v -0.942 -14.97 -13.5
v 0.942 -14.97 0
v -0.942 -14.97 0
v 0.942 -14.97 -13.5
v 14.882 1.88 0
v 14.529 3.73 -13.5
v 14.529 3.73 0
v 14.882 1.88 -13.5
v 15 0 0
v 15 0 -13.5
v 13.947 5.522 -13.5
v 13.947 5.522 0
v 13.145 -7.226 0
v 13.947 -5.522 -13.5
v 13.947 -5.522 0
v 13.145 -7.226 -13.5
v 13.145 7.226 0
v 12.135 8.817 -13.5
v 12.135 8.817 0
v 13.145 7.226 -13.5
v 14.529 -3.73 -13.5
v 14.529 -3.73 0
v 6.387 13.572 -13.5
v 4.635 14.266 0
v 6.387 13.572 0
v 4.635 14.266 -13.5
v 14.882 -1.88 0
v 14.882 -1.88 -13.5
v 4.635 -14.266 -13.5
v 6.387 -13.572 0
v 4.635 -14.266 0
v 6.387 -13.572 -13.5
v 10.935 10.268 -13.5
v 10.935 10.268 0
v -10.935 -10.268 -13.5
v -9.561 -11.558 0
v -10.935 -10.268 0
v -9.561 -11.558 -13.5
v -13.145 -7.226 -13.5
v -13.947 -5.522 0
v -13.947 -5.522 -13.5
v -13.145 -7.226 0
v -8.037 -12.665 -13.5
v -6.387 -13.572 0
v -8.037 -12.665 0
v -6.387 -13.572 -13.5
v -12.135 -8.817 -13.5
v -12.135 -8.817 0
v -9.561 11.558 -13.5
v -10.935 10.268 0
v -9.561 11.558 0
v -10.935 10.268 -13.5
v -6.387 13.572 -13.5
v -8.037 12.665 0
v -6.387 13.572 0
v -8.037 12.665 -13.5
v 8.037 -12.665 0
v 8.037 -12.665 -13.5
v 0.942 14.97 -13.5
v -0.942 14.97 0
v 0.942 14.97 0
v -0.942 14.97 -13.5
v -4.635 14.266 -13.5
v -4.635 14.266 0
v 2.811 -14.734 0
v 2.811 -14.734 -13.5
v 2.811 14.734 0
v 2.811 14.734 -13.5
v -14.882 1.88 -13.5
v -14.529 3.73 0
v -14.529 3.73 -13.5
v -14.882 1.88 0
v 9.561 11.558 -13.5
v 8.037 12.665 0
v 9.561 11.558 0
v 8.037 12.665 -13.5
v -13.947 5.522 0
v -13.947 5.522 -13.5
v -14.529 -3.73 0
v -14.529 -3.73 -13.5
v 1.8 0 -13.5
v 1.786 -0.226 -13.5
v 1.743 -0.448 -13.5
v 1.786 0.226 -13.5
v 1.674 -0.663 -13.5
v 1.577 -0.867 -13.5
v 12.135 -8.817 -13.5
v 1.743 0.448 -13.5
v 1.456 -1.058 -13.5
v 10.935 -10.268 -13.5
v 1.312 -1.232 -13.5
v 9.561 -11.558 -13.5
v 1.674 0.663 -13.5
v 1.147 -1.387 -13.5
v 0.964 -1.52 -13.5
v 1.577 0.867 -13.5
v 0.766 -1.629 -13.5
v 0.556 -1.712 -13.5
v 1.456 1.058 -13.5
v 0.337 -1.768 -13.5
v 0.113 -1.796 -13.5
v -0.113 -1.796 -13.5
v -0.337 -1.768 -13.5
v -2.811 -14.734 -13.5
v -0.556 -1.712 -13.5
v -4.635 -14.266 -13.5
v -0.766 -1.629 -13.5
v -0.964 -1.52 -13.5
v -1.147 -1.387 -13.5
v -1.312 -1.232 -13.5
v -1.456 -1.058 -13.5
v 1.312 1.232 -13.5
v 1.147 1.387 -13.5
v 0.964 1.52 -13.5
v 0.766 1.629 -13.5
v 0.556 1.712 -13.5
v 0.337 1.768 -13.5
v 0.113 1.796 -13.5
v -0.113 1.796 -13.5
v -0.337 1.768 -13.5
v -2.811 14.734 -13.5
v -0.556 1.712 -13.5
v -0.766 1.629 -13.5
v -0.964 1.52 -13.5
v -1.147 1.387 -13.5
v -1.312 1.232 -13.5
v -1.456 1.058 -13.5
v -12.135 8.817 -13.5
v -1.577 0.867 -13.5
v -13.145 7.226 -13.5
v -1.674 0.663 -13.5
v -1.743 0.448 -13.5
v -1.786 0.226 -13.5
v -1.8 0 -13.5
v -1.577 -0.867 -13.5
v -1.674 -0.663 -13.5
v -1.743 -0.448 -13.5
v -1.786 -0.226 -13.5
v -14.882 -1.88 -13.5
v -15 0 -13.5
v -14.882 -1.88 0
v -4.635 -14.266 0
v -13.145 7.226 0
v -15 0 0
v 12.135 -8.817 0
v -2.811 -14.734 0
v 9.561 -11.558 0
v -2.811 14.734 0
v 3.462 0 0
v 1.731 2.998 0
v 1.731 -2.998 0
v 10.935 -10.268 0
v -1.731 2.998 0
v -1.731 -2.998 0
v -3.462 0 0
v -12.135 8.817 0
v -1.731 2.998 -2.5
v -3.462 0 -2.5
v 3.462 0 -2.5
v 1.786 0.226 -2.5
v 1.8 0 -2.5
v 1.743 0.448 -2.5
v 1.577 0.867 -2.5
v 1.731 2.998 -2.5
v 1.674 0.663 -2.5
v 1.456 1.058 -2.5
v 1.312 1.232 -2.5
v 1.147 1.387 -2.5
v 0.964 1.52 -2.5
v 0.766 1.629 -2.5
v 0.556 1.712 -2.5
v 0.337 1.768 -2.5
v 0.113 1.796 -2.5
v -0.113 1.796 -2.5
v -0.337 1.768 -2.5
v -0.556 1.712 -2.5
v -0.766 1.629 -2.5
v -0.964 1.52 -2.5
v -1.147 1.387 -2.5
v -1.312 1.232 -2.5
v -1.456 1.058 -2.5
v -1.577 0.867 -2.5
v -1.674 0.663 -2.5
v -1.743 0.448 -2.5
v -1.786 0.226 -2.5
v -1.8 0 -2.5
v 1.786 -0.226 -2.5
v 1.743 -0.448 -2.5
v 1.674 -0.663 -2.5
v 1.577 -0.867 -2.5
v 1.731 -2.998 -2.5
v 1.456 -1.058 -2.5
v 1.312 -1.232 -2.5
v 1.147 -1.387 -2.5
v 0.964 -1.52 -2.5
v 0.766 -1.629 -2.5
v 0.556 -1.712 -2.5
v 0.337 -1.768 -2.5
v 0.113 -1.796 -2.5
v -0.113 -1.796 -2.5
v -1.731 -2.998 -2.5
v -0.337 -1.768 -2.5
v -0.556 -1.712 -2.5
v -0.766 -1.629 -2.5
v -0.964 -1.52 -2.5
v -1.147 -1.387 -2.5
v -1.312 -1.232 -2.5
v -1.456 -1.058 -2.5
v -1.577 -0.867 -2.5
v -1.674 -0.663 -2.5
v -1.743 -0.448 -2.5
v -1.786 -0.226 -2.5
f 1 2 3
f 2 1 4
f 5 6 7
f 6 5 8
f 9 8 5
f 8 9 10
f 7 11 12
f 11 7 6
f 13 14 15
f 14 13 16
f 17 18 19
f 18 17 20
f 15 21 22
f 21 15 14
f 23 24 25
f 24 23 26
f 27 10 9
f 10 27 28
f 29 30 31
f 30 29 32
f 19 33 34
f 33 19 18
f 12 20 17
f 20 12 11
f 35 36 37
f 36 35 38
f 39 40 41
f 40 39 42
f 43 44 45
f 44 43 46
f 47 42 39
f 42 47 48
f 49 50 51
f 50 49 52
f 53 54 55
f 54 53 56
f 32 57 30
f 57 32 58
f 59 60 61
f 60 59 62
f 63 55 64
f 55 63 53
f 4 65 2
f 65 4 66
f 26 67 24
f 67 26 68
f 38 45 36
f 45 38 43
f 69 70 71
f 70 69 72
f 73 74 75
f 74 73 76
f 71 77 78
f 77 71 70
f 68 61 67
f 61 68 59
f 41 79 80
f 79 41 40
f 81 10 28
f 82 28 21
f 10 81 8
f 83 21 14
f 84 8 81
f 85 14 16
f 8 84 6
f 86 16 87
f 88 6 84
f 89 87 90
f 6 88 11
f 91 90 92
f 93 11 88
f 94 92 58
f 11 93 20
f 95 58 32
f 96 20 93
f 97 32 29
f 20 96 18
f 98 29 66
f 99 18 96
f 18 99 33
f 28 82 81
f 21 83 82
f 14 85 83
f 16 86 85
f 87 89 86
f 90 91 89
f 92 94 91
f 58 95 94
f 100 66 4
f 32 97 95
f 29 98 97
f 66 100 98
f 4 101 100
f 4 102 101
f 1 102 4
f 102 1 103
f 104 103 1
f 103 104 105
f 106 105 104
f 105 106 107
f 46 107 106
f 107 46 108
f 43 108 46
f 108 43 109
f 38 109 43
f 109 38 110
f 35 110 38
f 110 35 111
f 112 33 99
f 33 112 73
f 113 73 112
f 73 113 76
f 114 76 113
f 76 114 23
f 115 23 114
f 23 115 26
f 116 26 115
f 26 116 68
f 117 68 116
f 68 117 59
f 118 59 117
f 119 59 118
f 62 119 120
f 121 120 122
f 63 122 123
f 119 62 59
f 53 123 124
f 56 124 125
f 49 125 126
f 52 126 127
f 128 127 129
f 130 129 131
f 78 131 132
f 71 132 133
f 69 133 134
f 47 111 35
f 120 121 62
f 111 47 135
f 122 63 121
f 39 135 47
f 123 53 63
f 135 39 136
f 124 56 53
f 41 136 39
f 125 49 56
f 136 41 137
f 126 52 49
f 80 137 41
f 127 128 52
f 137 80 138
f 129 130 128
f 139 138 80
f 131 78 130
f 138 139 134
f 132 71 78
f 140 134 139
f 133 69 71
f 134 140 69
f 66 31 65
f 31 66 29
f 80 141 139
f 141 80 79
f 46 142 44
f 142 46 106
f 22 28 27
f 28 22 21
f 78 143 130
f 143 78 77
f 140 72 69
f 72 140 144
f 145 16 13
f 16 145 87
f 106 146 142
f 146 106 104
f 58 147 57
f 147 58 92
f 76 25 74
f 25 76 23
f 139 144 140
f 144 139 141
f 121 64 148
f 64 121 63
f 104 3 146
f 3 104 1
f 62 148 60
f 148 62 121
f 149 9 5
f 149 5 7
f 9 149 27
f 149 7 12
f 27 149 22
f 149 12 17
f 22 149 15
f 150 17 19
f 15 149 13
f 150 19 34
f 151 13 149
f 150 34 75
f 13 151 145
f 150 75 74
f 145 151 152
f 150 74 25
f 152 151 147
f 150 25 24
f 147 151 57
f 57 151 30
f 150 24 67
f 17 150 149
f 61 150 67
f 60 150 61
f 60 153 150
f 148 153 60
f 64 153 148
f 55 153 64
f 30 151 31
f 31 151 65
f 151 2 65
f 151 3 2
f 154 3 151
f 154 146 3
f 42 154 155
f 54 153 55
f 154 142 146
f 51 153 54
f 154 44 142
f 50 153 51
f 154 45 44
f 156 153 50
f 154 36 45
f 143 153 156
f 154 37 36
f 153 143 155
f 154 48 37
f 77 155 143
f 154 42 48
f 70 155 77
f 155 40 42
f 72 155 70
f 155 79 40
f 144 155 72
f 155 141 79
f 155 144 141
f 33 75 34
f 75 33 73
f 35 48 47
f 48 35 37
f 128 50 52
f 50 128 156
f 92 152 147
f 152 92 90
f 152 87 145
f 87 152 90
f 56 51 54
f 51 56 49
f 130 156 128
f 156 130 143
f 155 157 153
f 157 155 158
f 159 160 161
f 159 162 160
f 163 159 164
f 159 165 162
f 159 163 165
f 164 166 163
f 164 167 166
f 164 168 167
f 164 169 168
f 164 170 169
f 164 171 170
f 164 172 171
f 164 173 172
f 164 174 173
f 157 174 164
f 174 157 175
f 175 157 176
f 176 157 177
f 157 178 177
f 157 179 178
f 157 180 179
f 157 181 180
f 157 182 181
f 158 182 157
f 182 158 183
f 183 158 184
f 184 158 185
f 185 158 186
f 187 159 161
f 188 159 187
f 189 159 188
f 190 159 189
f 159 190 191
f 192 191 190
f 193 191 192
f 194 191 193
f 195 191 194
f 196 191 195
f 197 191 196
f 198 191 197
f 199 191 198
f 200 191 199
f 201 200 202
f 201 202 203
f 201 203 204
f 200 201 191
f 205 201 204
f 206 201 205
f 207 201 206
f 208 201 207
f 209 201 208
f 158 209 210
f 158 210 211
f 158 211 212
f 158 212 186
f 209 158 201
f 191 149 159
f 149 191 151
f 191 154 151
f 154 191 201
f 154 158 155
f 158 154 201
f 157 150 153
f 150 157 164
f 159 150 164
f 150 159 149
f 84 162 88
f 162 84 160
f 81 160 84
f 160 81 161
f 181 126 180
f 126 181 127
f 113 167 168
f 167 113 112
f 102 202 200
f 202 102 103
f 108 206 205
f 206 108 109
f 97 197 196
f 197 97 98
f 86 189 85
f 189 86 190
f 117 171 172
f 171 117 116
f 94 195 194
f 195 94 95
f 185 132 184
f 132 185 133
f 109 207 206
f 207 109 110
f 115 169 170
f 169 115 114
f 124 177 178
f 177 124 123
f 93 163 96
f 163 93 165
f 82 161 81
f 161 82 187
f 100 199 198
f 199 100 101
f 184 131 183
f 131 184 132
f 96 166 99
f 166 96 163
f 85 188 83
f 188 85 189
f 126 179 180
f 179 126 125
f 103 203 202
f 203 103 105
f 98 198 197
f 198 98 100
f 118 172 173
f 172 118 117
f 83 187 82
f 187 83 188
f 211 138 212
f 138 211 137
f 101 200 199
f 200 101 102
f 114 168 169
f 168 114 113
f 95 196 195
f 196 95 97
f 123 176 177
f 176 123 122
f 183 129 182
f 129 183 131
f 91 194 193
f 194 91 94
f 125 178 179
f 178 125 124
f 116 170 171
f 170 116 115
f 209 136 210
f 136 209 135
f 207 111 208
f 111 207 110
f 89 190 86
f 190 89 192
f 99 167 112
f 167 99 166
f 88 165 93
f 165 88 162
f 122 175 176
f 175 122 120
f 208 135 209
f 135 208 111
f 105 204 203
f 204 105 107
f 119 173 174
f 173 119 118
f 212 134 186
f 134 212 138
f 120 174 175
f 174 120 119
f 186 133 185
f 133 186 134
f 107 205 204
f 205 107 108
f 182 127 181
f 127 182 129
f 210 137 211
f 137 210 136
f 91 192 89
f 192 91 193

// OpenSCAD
$fn = 50;


difference() {
	union() {
		translate(v = [0, 0, -13.5000000000]) {
			cylinder(h = 13.5000000000, r = 15.0000000000);
		}
		translate(v = [0, 0, -12.0000000000]) {
			cylinder(h = 12, r = 2.8750000000);
		}
	}
	union() {
		translate(v = [0, 0, 0]) {
			rotate(a = [0, 0, 0]) {
				difference() {
					union() {
						translate(v = [0, 0, -2.5000000000]) {
							linear_extrude(height = 2.5000000000) {
								polygon(points = [[3.4620000000, 0.0000000000], [1.7310000000, 2.9981799479], [-1.7310000000, 2.9981799479], [-3.4620000000, 0.0000000000], [-1.7310000000, -2.9981799479], [1.7310000000, -2.9981799479]]);
							}
						}
					}
					union();
				}
			}
		}
		#translate(v = [0, 0, -100.0000000000]) {
			cylinder(h = 200, r = 1.8000000000);
		}
	}
}
